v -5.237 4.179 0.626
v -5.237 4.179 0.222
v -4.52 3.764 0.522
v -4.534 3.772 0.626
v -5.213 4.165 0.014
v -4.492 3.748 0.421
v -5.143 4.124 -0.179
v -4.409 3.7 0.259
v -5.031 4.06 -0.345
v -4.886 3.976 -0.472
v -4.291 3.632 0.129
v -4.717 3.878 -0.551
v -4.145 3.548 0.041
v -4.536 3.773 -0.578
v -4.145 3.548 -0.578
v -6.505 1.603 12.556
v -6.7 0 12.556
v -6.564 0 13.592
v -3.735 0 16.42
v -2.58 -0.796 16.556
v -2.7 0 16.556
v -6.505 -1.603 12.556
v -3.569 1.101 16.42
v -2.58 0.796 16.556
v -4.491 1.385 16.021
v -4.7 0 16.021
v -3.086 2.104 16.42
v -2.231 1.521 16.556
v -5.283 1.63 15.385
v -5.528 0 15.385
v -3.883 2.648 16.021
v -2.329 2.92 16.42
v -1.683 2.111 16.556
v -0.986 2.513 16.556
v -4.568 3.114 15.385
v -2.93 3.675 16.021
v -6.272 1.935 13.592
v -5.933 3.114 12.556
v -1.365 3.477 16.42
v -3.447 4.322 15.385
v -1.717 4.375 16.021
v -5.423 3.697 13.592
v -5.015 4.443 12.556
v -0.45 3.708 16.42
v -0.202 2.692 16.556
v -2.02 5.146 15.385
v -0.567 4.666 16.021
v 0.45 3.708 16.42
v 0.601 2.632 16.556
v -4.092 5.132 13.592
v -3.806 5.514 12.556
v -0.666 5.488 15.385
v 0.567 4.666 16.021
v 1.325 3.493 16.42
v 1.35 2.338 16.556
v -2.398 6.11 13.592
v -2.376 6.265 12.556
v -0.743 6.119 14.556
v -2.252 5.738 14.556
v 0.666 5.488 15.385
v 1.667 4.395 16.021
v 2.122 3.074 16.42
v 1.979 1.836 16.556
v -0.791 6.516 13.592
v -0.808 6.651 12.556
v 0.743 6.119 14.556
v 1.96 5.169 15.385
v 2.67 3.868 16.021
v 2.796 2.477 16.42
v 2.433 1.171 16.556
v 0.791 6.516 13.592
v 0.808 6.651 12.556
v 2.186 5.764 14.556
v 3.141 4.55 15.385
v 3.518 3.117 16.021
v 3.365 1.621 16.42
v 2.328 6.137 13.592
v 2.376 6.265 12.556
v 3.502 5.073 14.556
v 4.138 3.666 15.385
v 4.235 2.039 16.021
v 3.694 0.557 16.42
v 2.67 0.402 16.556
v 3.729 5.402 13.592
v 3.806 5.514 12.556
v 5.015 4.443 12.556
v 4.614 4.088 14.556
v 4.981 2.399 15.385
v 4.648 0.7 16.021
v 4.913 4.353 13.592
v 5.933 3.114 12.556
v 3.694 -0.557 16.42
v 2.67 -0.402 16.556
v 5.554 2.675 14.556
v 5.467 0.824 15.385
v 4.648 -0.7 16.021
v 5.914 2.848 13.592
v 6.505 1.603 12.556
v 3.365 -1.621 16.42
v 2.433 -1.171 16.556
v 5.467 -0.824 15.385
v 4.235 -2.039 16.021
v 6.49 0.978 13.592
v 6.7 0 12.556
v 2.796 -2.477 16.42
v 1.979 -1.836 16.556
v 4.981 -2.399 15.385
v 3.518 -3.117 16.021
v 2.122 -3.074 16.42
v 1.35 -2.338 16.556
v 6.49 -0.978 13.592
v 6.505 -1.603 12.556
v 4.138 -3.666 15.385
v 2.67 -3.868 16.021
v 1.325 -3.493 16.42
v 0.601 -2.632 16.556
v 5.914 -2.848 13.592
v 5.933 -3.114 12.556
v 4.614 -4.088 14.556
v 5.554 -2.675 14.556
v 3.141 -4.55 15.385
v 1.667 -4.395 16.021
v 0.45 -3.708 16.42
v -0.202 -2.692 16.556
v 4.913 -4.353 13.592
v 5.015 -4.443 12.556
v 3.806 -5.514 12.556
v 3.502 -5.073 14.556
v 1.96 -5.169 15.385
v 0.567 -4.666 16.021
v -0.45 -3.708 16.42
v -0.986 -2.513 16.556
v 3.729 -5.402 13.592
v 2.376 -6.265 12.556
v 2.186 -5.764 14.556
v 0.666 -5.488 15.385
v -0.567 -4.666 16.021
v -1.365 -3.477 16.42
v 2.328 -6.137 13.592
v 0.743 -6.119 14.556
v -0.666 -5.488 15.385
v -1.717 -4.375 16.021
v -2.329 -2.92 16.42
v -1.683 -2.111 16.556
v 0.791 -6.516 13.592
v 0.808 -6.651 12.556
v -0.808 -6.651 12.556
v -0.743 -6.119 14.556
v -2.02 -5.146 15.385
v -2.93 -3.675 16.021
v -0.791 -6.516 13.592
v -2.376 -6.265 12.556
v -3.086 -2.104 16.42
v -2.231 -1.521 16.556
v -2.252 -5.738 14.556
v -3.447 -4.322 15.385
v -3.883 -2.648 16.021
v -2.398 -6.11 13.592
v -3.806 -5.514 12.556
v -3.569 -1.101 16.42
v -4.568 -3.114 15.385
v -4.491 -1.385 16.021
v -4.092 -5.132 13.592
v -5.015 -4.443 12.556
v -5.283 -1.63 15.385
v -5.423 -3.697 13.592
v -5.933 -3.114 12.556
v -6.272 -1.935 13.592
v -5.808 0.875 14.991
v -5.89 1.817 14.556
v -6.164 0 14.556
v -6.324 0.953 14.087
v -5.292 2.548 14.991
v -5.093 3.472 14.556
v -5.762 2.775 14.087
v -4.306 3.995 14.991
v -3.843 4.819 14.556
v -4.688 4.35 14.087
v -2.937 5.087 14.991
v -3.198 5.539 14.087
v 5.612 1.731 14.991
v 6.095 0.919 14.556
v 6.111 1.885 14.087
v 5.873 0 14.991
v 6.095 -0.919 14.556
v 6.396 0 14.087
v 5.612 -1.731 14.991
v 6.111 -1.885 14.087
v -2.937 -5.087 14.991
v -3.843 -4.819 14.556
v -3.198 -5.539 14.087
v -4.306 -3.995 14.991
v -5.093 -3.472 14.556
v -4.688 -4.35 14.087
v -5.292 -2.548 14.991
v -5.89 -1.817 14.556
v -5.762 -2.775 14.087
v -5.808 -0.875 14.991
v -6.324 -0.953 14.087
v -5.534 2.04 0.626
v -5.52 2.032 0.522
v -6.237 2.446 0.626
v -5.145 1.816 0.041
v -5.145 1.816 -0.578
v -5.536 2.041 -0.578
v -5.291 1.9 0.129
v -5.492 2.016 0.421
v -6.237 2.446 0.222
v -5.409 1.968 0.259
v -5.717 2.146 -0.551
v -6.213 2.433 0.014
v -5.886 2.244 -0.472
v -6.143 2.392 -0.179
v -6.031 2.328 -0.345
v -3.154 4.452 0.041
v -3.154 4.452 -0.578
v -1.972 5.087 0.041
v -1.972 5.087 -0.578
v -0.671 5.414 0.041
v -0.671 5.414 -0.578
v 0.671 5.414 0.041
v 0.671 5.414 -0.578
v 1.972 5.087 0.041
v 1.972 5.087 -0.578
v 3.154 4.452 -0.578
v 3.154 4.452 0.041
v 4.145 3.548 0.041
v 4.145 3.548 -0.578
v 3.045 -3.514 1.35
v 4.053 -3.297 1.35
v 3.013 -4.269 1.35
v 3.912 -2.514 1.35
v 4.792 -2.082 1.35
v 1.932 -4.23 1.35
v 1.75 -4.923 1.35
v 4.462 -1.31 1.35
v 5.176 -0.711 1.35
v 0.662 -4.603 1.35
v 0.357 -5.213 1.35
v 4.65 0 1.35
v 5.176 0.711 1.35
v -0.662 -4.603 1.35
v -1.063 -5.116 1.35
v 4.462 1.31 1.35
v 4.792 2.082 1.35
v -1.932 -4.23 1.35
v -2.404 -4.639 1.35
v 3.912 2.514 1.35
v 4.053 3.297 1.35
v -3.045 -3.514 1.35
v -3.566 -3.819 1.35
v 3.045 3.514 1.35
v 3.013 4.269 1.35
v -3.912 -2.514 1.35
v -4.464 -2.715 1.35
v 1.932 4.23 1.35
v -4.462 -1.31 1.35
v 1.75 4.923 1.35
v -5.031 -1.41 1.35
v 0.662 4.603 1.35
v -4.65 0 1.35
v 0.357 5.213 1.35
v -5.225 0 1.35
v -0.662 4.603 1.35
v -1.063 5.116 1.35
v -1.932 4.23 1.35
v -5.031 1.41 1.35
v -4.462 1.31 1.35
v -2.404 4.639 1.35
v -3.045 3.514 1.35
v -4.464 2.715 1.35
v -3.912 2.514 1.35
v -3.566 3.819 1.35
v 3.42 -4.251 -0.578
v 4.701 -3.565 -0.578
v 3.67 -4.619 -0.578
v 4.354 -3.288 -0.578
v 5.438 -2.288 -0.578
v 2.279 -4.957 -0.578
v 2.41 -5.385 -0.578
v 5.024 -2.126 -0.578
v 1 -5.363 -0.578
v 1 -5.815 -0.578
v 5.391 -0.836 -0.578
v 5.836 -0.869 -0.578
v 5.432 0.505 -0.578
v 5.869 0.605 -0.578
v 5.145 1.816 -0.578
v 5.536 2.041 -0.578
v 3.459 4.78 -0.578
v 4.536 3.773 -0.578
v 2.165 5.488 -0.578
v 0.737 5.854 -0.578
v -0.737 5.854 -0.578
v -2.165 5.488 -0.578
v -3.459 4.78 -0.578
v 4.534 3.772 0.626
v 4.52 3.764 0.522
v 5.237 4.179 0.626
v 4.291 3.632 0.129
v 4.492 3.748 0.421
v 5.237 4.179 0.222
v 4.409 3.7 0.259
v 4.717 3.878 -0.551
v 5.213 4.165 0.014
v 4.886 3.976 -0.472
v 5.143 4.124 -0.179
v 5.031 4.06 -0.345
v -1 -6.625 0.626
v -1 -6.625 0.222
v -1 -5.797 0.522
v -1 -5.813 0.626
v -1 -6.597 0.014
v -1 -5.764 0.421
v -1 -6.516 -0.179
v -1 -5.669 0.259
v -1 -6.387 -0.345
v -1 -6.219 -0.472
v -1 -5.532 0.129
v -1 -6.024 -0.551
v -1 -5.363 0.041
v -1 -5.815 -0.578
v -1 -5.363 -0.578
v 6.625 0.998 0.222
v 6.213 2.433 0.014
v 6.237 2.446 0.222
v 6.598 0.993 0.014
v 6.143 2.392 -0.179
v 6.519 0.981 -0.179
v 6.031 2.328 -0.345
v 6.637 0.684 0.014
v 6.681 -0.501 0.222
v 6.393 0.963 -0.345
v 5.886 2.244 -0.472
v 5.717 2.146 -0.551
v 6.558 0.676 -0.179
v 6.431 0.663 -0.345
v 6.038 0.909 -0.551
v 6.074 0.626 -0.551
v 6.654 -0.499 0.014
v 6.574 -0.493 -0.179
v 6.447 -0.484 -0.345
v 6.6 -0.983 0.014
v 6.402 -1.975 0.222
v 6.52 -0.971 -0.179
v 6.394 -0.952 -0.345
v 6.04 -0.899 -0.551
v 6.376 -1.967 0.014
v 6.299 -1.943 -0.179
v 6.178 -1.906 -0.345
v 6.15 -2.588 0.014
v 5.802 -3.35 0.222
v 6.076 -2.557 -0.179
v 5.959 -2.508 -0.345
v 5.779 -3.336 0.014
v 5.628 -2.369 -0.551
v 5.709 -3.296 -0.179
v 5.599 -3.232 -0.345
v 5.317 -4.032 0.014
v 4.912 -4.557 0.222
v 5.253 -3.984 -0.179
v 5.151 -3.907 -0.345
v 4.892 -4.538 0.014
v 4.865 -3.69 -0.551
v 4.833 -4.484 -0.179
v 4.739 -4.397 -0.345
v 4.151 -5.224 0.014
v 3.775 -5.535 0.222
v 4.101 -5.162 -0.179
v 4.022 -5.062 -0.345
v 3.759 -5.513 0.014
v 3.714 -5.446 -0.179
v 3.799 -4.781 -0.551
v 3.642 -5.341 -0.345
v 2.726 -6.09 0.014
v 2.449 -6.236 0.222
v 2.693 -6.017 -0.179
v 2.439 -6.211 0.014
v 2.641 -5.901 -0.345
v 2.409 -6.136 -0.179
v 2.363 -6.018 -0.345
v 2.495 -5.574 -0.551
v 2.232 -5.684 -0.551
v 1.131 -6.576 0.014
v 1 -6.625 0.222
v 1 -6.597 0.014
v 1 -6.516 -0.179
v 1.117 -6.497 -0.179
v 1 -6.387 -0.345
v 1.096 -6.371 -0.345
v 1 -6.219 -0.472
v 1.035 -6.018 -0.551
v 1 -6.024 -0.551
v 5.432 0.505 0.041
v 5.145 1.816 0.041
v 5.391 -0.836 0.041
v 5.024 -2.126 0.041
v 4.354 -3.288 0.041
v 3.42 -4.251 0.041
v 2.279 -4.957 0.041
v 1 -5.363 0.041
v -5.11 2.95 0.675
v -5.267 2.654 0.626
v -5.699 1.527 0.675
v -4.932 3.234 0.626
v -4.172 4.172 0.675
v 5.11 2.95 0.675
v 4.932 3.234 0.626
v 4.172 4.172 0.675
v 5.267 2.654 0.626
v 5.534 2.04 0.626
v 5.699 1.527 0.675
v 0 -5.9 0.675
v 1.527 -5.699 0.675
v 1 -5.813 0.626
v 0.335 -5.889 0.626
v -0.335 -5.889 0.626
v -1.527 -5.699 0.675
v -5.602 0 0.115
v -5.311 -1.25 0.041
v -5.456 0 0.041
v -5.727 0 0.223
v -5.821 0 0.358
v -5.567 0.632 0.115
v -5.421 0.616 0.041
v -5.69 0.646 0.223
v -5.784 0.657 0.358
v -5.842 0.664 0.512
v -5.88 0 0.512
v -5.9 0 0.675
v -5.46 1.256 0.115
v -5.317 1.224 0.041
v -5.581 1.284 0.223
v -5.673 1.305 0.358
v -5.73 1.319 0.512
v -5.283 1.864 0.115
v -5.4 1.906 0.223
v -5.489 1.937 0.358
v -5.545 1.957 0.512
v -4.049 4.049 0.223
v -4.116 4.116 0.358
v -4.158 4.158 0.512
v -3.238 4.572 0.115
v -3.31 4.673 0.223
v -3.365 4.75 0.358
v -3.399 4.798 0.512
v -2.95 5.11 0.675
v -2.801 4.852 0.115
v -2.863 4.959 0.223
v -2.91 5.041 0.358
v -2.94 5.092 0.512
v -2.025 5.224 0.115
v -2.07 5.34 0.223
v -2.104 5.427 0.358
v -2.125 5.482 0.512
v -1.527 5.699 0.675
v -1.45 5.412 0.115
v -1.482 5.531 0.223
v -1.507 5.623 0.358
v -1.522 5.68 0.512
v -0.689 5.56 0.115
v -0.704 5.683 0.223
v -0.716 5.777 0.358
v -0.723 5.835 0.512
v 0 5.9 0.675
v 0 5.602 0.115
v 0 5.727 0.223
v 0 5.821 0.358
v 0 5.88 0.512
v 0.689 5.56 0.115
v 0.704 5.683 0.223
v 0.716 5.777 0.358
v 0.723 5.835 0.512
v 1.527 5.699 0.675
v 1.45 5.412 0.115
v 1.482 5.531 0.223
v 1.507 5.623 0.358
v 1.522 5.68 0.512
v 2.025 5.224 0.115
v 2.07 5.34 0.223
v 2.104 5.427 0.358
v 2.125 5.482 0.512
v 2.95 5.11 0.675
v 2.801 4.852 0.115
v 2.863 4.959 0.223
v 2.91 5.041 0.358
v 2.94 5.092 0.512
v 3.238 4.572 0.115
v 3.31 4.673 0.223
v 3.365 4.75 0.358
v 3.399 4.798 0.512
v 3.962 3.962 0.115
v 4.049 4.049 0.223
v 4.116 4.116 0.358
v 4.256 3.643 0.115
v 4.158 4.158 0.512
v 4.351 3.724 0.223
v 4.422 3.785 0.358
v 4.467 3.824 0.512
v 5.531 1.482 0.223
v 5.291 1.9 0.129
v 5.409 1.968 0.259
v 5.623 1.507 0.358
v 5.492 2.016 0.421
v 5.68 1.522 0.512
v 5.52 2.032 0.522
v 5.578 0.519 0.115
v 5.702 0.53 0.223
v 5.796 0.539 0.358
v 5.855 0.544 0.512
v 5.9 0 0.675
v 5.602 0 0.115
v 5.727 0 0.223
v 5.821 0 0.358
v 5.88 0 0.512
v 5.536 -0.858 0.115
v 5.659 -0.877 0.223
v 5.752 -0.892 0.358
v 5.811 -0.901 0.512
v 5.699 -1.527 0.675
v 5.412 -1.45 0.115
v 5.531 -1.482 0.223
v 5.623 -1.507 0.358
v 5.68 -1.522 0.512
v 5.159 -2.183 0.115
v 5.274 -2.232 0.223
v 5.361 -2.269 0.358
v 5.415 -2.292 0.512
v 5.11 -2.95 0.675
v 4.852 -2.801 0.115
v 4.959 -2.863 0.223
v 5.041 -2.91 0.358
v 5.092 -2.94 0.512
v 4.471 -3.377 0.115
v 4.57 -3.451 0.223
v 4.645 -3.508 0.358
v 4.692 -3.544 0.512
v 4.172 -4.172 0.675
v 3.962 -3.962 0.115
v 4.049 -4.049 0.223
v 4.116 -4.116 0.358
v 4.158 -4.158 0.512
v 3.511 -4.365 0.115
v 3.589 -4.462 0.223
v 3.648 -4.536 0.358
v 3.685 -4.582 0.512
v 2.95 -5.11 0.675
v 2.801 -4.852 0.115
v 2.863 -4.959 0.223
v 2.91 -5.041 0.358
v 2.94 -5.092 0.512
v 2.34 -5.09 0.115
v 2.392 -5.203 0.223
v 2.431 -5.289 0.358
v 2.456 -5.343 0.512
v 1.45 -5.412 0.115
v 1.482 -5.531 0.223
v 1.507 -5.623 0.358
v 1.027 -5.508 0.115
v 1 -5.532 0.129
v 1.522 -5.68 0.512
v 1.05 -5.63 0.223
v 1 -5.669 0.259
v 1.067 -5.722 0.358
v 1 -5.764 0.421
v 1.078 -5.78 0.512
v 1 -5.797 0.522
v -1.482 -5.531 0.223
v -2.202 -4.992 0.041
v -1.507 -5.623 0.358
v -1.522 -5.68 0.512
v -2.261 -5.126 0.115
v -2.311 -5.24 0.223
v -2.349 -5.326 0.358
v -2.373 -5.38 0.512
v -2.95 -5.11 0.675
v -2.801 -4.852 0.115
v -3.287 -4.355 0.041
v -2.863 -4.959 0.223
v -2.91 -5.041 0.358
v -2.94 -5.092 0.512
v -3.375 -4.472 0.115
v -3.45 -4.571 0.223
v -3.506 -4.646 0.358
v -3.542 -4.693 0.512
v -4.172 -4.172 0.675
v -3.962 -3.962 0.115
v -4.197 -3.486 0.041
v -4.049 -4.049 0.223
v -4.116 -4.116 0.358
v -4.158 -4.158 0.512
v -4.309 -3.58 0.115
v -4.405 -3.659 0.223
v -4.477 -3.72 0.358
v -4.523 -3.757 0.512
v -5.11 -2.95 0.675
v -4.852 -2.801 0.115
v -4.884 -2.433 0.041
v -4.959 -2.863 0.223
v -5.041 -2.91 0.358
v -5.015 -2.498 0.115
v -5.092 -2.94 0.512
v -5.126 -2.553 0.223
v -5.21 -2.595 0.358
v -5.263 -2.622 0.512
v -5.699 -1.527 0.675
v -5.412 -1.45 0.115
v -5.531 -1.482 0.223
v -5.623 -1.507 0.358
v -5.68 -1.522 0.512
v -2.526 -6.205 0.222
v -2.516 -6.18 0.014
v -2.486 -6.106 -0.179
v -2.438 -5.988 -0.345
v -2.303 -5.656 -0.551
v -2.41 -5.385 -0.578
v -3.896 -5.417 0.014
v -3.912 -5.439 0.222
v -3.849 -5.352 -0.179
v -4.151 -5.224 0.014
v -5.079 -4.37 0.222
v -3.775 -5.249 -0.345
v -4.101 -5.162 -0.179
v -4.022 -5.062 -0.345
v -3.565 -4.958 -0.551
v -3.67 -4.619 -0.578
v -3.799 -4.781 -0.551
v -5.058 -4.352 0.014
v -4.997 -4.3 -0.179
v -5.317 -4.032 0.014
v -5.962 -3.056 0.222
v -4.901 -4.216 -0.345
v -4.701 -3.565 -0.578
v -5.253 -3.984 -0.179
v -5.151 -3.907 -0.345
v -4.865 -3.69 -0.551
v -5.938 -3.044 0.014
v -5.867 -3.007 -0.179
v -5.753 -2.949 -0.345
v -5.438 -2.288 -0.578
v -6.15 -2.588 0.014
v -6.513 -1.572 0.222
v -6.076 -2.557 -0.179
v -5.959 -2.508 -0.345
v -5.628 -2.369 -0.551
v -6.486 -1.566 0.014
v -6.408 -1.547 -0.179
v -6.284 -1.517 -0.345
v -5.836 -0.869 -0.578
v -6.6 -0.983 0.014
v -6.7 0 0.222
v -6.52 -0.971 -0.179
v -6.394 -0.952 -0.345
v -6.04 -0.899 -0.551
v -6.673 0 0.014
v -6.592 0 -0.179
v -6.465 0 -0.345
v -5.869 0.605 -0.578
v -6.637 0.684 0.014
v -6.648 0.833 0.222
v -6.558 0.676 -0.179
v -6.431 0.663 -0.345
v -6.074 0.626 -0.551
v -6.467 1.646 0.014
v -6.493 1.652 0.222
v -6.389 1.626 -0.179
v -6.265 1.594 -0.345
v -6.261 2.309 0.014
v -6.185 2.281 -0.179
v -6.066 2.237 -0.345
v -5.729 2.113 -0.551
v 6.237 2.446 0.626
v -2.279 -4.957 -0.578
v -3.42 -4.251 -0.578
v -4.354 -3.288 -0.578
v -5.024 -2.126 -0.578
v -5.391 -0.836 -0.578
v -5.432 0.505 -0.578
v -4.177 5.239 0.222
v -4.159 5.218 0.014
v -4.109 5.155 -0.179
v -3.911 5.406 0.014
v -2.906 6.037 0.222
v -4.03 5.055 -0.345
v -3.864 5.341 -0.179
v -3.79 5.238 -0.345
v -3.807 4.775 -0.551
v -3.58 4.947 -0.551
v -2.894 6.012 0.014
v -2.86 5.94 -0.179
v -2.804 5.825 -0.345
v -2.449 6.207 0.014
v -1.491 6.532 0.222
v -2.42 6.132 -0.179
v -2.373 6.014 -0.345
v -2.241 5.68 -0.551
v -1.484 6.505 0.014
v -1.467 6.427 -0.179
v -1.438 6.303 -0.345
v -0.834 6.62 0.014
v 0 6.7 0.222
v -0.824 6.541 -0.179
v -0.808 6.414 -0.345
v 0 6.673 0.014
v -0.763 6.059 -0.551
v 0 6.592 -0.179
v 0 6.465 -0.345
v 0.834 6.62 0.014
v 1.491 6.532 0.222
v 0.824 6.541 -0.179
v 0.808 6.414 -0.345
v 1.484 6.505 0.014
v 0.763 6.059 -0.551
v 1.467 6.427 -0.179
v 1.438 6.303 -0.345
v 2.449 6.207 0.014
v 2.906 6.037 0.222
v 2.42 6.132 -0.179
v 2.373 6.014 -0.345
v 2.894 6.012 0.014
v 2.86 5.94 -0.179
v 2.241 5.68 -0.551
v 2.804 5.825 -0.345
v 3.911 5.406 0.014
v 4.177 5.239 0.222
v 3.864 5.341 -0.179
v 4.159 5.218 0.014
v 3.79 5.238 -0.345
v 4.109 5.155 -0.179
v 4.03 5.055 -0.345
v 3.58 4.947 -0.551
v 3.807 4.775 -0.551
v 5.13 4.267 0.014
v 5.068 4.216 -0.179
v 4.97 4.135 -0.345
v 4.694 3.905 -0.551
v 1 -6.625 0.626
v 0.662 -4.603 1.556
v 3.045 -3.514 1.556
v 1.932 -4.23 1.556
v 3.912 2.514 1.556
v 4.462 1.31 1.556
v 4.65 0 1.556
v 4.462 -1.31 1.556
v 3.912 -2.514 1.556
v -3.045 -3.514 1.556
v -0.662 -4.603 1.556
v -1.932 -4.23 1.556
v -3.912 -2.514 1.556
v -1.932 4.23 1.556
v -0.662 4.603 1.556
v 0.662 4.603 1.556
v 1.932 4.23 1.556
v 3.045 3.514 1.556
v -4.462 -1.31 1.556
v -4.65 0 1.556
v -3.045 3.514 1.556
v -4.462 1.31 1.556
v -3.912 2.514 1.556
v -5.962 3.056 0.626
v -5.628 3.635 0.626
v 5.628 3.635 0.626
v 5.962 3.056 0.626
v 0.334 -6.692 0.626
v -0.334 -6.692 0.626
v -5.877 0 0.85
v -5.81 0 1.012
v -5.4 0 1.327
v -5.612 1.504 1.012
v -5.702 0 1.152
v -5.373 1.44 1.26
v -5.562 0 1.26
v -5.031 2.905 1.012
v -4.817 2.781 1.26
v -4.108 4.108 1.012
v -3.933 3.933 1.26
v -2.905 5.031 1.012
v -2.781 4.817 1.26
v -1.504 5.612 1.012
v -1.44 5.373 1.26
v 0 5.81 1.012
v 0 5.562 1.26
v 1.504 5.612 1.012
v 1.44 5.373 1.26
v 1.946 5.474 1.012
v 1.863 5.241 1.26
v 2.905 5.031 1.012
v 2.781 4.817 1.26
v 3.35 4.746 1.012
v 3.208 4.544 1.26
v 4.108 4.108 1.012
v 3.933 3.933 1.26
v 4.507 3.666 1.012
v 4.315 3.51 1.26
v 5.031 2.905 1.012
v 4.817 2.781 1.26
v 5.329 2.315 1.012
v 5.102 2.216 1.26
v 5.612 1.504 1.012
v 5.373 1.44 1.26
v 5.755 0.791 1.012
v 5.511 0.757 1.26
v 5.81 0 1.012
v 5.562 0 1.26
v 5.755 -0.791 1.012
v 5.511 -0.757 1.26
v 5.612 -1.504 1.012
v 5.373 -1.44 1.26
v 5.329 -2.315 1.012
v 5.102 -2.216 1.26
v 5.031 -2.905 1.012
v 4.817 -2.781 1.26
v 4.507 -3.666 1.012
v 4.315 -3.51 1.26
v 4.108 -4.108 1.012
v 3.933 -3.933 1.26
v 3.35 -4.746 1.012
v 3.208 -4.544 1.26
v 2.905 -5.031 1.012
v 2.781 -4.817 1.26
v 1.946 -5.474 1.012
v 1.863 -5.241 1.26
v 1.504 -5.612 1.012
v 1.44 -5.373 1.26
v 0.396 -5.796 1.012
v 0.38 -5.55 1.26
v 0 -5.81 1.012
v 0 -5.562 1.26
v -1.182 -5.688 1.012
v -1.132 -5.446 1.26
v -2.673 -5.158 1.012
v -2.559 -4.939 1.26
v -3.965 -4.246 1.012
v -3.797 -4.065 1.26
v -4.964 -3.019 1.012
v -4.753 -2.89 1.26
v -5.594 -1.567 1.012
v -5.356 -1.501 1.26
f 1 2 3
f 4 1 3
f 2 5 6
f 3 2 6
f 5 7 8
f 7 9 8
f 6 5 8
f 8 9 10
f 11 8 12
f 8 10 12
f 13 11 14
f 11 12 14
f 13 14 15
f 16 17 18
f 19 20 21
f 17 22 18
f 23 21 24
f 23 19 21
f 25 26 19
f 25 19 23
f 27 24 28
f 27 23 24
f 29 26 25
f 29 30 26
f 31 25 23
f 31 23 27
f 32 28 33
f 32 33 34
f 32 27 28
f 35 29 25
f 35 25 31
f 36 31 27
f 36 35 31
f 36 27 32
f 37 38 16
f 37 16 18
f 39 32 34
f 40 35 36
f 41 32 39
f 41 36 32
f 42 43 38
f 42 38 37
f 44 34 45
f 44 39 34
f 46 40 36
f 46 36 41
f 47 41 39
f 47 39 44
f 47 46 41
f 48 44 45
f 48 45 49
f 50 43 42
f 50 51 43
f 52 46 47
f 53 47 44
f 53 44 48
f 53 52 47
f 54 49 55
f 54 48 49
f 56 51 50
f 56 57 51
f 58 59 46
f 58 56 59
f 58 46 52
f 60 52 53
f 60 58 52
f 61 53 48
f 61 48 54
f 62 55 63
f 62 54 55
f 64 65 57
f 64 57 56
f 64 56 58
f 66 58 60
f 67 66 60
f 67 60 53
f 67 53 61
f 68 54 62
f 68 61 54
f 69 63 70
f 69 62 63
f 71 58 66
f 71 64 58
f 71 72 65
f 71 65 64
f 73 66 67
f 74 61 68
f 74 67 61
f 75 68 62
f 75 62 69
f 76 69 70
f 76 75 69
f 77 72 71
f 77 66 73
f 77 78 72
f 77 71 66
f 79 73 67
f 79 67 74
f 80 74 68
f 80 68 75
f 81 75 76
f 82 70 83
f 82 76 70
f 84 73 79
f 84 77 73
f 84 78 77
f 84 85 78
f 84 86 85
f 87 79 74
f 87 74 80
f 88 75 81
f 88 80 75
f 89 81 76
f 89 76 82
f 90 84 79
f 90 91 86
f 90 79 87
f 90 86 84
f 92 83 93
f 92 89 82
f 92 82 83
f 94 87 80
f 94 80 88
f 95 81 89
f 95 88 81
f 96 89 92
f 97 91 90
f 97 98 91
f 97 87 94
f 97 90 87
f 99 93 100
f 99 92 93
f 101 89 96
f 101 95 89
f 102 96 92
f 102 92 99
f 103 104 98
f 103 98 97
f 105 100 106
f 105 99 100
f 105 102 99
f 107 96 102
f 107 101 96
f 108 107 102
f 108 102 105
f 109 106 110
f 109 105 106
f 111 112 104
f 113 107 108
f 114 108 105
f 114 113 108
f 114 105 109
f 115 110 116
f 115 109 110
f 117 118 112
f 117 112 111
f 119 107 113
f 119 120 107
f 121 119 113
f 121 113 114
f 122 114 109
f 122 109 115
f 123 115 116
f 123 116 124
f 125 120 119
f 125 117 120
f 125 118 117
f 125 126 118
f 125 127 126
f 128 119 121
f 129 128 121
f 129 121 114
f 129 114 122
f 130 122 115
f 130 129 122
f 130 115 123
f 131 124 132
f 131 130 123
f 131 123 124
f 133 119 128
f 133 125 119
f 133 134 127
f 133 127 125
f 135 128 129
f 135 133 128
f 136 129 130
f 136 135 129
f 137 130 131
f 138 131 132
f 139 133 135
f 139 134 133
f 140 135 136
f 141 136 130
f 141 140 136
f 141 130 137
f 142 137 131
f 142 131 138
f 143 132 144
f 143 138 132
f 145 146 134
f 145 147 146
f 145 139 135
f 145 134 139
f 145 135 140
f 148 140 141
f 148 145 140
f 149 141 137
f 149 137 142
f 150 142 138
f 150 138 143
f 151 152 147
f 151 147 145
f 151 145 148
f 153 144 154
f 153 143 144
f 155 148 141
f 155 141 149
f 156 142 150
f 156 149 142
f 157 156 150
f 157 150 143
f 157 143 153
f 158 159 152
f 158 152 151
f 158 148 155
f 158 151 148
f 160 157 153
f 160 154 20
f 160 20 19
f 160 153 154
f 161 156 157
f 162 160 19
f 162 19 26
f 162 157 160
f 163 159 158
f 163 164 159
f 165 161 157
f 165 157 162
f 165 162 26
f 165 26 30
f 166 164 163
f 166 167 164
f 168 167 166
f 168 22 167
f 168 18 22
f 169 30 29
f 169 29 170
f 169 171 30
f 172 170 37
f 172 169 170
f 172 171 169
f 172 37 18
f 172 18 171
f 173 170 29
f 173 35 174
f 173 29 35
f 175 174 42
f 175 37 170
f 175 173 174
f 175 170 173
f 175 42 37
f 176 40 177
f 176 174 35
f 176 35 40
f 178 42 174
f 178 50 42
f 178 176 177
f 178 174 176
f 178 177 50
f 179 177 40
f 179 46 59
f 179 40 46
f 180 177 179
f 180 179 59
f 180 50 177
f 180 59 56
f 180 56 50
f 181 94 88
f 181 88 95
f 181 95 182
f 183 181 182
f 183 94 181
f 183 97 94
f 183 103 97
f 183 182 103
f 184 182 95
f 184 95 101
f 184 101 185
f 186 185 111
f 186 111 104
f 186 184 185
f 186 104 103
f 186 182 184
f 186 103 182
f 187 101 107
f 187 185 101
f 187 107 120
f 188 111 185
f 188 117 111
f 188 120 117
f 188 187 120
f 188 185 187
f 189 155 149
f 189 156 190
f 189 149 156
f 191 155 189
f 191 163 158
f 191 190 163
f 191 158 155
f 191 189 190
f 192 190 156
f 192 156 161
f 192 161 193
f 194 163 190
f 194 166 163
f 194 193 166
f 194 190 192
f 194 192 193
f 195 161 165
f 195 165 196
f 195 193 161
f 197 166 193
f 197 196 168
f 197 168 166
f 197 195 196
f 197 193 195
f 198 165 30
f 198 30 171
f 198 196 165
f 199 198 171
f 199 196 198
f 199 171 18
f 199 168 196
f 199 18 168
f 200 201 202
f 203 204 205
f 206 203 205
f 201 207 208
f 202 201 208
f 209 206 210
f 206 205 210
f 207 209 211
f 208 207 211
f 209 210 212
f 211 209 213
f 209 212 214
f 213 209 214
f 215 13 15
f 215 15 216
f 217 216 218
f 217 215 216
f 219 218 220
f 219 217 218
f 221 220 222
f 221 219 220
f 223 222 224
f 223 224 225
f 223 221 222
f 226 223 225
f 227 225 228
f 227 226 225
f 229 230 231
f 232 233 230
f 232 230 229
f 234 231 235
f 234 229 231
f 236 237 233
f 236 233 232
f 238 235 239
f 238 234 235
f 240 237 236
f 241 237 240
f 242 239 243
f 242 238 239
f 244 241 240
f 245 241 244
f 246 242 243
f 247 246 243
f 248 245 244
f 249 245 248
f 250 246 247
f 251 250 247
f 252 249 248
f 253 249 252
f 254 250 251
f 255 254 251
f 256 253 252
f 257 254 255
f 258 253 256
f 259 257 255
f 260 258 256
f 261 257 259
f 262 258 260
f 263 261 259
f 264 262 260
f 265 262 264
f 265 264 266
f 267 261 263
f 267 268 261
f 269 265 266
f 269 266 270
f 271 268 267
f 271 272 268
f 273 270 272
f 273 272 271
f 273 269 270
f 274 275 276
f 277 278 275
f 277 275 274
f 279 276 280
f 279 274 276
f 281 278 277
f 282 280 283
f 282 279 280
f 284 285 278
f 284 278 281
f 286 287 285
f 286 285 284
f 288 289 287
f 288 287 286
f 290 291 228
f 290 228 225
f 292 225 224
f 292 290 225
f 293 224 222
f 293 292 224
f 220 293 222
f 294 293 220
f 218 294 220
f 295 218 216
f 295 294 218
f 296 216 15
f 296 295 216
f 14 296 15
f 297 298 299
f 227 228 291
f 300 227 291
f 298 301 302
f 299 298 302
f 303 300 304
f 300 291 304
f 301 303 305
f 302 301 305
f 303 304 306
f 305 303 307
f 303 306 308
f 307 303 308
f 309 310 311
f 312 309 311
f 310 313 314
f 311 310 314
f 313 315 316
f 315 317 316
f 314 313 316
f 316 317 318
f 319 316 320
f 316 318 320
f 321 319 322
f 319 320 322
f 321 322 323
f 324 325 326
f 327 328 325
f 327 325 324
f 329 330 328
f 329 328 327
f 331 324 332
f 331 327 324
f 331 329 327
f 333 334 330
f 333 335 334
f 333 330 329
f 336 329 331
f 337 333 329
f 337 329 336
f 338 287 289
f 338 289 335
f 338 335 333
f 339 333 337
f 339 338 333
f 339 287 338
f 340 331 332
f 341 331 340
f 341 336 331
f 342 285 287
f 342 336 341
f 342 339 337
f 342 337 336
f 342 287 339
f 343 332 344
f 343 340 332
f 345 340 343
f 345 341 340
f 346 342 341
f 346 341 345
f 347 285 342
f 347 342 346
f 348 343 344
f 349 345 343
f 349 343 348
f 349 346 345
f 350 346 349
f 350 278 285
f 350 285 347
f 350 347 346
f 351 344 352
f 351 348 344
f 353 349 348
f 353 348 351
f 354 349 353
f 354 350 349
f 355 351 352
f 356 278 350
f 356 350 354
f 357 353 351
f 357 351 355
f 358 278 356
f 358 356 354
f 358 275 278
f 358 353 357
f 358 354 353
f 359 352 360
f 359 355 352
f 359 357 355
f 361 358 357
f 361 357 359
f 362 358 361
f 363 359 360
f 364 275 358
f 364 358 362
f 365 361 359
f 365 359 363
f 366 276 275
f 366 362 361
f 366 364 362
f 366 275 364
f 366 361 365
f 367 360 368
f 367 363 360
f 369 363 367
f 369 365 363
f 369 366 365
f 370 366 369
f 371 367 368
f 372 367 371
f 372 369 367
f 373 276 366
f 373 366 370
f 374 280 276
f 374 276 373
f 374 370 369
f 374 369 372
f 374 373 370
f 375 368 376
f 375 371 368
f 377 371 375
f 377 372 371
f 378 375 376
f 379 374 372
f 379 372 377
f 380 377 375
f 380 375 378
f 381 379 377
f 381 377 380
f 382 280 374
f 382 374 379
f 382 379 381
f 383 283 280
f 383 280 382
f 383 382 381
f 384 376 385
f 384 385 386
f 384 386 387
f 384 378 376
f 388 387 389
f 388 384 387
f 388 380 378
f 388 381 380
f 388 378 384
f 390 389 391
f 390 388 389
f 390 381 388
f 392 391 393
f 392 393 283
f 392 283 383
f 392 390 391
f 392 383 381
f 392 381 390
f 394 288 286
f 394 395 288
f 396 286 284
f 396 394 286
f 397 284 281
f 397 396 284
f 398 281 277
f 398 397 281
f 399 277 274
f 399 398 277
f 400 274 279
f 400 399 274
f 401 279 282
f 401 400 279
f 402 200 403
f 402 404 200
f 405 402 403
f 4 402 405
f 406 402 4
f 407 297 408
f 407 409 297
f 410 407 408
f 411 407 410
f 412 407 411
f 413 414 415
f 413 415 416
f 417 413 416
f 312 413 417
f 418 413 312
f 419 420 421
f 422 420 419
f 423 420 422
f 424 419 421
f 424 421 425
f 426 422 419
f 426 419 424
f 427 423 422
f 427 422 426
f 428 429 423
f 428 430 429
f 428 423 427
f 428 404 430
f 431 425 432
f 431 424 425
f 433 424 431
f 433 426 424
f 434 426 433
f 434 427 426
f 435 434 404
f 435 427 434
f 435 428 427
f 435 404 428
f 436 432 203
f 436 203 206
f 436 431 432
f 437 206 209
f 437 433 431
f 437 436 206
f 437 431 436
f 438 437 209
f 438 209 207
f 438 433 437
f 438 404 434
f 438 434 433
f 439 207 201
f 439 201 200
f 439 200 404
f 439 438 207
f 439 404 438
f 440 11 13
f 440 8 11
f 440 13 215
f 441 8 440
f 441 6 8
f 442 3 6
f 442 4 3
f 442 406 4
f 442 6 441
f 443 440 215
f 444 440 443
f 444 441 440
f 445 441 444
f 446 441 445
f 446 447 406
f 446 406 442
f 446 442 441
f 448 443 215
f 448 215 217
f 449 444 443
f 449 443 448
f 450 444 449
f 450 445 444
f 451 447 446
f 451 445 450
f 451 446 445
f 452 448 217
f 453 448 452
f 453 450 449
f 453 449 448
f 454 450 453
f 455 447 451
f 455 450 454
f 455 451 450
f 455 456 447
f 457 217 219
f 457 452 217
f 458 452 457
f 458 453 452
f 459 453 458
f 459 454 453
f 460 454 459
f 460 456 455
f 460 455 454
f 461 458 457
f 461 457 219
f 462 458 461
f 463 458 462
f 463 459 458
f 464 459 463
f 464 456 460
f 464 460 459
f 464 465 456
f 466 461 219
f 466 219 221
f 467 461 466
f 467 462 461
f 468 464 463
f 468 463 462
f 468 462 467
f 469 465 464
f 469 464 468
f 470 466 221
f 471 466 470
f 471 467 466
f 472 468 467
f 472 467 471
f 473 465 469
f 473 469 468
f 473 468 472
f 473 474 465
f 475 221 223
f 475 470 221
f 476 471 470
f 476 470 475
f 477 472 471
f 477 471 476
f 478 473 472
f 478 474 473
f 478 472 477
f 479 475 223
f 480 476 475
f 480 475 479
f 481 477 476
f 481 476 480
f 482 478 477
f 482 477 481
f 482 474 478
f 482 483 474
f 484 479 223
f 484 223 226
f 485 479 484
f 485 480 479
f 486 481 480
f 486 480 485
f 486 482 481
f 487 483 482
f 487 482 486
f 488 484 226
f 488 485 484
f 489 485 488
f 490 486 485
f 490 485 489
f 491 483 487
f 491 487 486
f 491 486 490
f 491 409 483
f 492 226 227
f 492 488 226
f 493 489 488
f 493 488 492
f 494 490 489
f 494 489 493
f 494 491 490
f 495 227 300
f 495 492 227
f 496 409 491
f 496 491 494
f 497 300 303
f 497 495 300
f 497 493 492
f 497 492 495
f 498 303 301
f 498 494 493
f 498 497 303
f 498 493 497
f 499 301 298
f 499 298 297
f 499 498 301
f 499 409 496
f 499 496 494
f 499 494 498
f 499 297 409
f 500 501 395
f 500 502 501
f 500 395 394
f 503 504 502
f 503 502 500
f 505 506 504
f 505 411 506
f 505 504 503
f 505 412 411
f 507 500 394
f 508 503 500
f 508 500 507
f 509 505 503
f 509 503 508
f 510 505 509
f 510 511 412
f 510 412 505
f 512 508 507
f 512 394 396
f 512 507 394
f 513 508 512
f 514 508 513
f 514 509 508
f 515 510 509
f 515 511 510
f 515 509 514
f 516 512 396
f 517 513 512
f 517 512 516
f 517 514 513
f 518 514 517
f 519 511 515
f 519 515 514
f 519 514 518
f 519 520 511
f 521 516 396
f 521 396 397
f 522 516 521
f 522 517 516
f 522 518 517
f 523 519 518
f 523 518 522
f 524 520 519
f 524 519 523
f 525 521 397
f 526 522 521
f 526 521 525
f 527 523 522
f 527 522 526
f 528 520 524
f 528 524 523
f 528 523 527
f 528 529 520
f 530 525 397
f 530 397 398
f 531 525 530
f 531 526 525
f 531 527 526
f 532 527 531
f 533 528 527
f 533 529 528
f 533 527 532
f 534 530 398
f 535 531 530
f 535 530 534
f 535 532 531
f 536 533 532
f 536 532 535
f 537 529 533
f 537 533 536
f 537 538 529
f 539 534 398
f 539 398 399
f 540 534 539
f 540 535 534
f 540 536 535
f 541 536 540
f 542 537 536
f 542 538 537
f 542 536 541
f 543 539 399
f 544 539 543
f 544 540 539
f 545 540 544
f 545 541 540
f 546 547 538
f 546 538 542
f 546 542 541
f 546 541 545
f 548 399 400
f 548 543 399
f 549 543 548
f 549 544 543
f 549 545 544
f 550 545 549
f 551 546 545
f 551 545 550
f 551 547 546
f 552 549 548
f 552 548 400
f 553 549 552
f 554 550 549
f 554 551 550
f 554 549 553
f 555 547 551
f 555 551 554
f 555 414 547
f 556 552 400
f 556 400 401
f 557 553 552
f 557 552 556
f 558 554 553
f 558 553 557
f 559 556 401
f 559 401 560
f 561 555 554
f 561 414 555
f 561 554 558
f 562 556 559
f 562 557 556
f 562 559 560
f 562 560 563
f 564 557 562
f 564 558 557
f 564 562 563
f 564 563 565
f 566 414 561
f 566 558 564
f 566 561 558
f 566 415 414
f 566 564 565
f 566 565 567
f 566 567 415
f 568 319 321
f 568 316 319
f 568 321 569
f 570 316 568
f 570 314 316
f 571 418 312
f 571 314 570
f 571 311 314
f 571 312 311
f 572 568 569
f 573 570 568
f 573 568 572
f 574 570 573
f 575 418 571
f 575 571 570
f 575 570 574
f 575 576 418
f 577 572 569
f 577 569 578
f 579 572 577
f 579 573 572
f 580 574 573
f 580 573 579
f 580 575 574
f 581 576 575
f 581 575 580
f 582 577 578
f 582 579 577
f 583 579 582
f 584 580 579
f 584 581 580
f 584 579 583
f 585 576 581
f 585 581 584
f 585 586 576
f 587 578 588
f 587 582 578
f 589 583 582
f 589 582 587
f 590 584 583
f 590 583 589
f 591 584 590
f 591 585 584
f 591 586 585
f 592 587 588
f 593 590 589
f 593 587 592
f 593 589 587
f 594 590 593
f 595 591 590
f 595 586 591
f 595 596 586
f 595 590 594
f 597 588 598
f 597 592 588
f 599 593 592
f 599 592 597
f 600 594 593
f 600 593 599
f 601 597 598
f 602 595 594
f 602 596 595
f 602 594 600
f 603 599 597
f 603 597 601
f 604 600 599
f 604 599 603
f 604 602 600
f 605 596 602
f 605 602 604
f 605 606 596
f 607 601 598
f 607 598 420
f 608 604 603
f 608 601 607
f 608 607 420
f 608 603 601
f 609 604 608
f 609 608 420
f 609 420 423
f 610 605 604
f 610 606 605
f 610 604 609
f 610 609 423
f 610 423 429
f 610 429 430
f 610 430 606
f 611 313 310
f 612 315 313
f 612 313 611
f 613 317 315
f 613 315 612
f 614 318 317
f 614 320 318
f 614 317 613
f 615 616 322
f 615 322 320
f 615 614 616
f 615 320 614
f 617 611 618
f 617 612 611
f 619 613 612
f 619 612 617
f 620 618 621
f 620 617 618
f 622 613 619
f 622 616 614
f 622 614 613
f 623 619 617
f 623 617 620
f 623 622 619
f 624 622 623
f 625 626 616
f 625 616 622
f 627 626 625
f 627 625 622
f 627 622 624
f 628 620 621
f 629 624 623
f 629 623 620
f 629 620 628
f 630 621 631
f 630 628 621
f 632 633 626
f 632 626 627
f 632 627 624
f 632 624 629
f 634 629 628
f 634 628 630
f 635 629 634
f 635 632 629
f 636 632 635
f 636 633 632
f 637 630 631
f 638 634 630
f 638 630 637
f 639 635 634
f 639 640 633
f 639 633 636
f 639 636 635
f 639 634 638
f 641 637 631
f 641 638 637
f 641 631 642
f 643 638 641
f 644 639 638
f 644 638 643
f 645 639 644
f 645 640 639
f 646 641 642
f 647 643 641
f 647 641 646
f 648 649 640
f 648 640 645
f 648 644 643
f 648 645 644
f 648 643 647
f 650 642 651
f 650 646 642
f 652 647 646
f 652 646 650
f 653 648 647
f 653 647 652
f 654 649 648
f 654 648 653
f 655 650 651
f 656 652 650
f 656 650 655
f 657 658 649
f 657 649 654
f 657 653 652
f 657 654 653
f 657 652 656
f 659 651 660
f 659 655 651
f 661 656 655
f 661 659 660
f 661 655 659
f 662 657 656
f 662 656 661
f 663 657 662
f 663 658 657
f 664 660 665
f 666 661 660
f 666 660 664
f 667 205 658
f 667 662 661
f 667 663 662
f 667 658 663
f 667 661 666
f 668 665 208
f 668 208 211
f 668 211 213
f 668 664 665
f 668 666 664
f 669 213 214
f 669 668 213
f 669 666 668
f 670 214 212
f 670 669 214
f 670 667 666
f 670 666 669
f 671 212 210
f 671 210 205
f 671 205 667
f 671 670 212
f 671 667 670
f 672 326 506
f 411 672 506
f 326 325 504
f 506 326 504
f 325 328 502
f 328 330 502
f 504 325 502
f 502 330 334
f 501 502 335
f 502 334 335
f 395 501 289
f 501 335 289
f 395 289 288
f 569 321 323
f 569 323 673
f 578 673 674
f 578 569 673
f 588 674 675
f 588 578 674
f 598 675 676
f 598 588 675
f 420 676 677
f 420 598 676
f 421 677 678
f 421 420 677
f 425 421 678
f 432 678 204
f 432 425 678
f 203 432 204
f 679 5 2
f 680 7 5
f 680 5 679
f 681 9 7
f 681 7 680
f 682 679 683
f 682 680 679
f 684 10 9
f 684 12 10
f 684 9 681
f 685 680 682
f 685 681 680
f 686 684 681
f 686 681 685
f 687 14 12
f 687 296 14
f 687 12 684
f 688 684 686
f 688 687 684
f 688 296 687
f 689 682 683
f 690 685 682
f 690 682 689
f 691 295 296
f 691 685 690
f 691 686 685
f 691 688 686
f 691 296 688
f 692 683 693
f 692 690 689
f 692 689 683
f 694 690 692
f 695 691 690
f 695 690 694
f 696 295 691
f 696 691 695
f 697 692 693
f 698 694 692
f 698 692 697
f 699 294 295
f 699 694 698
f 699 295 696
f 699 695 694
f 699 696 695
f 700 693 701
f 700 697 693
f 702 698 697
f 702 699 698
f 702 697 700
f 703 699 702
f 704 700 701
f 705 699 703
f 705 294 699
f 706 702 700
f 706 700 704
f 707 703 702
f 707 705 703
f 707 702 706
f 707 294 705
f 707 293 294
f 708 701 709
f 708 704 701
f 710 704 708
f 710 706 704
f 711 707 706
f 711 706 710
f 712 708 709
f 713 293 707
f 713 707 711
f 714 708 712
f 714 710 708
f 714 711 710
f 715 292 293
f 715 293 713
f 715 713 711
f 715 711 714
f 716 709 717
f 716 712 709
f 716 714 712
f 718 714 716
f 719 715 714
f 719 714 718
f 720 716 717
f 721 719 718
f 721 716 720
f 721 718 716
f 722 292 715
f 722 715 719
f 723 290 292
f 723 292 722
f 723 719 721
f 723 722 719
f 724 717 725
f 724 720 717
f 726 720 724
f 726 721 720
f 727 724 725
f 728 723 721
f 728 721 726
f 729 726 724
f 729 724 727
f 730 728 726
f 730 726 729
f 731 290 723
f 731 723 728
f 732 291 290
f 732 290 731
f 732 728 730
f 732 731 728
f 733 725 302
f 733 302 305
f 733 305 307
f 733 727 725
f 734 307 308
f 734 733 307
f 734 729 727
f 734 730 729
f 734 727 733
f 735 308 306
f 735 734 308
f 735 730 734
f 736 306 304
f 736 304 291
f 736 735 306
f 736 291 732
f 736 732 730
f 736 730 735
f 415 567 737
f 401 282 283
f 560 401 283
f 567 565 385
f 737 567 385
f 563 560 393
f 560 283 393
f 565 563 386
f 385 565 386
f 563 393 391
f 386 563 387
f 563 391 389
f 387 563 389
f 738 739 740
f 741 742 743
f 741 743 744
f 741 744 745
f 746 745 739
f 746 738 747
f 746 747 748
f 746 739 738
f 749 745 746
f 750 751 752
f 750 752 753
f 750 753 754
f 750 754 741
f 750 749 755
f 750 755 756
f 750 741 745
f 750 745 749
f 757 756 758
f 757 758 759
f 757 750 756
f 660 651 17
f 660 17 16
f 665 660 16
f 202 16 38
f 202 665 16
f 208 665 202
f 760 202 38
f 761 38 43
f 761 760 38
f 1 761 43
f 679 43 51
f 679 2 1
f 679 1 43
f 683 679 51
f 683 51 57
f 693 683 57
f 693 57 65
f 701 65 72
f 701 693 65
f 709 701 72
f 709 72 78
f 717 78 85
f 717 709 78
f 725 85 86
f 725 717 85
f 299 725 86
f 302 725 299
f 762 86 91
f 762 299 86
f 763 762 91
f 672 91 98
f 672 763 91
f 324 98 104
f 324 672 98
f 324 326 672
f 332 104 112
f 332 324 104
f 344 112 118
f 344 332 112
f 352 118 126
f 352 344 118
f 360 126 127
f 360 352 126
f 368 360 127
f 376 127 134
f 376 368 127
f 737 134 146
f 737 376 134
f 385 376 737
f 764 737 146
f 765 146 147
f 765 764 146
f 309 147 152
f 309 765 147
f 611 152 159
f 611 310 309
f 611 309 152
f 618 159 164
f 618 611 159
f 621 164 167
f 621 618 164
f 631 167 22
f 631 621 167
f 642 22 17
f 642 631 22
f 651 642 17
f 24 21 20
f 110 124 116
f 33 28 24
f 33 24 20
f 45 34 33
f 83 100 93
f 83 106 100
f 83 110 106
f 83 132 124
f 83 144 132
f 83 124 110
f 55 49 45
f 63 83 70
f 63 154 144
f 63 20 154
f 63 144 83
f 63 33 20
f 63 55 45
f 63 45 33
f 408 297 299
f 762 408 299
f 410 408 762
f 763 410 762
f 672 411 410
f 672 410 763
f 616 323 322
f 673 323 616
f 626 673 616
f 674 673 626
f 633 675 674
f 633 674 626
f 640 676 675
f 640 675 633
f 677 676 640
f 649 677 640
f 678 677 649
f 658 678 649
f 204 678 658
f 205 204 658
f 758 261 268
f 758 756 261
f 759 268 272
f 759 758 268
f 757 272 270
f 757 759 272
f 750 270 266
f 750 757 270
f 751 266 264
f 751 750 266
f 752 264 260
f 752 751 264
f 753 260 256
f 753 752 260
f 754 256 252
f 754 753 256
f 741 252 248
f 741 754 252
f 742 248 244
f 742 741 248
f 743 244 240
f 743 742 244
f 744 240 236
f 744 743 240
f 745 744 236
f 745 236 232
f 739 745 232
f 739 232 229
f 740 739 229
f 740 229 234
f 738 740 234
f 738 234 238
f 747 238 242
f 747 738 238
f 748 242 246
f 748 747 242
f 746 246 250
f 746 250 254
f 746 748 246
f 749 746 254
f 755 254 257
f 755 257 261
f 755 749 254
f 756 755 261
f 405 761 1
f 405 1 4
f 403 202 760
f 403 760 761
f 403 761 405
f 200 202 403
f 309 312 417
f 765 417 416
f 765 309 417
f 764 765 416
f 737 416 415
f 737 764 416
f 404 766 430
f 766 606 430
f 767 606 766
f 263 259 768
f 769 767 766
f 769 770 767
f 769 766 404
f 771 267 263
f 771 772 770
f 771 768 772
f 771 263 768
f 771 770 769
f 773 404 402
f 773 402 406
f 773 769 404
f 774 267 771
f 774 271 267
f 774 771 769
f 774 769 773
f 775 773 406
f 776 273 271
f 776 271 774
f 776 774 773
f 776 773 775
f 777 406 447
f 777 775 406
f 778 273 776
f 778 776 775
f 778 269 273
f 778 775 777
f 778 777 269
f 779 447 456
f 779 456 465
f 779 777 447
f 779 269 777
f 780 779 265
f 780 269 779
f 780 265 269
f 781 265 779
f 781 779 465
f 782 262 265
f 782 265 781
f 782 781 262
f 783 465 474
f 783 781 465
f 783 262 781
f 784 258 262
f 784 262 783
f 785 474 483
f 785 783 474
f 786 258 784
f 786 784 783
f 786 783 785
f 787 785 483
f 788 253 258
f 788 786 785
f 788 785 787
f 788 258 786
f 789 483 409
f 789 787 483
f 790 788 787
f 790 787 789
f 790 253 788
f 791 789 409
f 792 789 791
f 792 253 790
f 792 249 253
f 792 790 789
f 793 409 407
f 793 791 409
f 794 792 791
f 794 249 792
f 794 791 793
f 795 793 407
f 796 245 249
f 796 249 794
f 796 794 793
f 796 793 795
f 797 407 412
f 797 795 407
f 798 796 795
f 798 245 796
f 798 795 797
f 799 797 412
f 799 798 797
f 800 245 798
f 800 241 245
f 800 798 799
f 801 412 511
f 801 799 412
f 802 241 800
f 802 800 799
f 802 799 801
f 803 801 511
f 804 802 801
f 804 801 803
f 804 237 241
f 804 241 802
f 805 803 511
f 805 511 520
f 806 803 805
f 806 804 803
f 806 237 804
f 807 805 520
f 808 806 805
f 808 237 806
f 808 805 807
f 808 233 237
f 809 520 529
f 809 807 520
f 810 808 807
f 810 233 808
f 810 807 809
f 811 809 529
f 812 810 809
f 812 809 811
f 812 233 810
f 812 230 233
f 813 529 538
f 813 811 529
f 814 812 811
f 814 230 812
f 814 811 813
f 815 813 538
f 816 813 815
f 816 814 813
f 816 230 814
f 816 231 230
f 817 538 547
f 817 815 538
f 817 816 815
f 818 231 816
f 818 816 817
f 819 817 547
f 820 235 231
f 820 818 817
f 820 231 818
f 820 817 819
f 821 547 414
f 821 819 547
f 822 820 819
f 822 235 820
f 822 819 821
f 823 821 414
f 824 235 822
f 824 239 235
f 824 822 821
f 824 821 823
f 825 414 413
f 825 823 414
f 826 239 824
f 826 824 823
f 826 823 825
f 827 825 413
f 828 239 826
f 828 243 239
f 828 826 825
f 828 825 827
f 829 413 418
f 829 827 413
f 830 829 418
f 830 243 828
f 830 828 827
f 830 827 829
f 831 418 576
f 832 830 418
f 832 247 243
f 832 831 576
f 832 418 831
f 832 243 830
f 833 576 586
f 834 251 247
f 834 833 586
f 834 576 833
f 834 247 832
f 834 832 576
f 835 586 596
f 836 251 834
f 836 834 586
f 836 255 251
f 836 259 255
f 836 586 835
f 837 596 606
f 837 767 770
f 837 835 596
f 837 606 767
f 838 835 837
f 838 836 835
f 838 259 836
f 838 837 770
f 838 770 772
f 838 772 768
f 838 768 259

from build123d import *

# Parameters (mm, degrees)
F3_R     = 0.8
F4_DEPTH = 1.204


with BuildPart() as f1:
    # F0 (on Front) → F1 (revolve)
    with BuildSketch(Plane.XZ):
        with BuildLine():
            Line((-4.65, 1.5564), (0, 1.5564))
            Line((0, 1.5564), (0, 16.5564))
            Line((0, 16.5564), (-2.7, 16.5564))
            ThreePointArc((-2.7, 16.5564), (-5.528427, 15.384827), (-6.7, 12.5564))
            Line((-6.7, 12.5564), (-6.7, -0.578493))
            Line((-6.7, -0.578493), (-5.455864, -0.578493))
            Line((-5.455864, -0.578493), (-5.455864, 0.040707))
            ThreePointArc((-5.455864, 0.040707), (-5.777928, 0.287836), (-5.9, 0.675))
            ThreePointArc((-5.9, 0.675), (-5.702297, 1.152297), (-5.225, 1.35))
            Line((-5.225, 1.35), (-4.65, 1.35))
            Line((-4.65, 1.35), (-4.65, 1.5564))
        make_face()
    revolve(axis=Axis((0, 0, 9.0564), (0, 0, -1)))

    # F3
    f3_edges = [f1.edges().sort_by_distance(p)[0] for p in [
        (6.7, 0, -0.578493),
    ]]
    fillet(f3_edges, radius=F3_R)

    # F2 (on face) → F4 (cut)
    with BuildSketch(Plane(origin=(0, 0, -0.578493), x_dir=(1, 0, 0), z_dir=(0, 0, -1))):
        Polygon((1, 10), (-1, 10), (-1, 0.57735), (-0.5, 0.866025), (0, 0), (0.5, 0.866025), (1, 0.57735), align=None)
        Polygon((-1, 0), (-1, 0.57735), (-9.160254, -4.133975), (-8.160254, -5.866025), (0, -1.154701), (-0.5, -0.866025), (0, 0), align=None)
        Polygon((9.160254, -4.133975), (1, 0.57735), (1, 0), (0, 0), (0.5, -0.866025), (0, -1.154701), (8.160254, -5.866025), align=None)
    extrude(amount=-F4_DEPTH, mode=Mode.SUBTRACT)


solid = f1.part
